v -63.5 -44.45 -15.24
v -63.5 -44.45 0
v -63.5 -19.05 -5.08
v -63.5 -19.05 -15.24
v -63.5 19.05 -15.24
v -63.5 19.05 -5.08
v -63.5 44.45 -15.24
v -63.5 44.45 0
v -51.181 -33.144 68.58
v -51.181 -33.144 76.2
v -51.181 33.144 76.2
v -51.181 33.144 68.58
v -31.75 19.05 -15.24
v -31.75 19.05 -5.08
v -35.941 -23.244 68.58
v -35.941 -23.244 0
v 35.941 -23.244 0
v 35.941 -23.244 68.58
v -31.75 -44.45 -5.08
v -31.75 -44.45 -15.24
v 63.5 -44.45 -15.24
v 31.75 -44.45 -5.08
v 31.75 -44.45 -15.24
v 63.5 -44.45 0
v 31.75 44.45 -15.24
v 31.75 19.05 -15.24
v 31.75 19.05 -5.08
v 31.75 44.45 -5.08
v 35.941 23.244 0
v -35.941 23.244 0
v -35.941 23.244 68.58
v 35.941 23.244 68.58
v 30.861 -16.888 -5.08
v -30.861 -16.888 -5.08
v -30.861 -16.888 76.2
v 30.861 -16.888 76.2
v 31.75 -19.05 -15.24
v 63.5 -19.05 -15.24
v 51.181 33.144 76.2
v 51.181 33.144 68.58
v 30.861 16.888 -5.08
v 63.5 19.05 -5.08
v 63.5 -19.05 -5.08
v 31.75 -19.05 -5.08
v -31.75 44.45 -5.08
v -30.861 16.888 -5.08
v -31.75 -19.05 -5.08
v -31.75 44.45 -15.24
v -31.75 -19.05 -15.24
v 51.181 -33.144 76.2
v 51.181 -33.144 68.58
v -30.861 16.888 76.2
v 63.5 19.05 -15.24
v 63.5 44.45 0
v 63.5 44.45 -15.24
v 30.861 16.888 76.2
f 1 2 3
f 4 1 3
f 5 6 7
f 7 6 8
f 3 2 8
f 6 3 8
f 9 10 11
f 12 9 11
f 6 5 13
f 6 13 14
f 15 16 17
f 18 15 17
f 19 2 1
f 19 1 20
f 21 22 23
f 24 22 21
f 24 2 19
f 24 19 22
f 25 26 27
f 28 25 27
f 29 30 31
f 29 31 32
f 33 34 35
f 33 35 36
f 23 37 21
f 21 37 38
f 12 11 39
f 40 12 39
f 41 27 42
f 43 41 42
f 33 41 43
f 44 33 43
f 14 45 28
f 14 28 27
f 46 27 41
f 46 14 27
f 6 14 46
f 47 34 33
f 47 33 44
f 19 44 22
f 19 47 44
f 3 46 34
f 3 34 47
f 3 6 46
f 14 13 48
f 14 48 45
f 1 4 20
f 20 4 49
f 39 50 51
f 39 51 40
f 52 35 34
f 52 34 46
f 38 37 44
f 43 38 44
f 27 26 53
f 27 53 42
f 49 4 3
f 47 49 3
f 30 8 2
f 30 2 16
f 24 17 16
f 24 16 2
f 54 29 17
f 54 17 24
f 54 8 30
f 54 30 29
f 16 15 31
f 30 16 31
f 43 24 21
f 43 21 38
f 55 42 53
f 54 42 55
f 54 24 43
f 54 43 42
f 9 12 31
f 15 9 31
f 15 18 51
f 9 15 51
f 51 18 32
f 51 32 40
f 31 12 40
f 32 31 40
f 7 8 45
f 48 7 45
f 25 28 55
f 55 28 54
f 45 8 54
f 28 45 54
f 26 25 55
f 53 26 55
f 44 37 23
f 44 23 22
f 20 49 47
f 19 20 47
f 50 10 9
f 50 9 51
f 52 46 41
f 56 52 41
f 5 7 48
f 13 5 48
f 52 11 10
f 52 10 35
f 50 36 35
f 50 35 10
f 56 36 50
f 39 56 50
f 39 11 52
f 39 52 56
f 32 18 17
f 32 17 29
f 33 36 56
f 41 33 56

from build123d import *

# Parameters (mm, degrees)
F0_W      = 127
F0_H      = 88.9
F1_DEPTH  = 15.24
F2_W      = 63.5
F2_H      = 10.16
F3_DEPTH  = 88.9
F4_W      = 38.1
F4_H      = 10.16
F5_DEPTH  = 127
F6_W      = 71.8820020556
F6_H      = 46.4872904122
F7_DEPTH  = 76.2
F8_W      = 61.7219954729
F8_H      = 33.7767079473
F9_DEPTH  = 101.6
F10_W     = 102.3619994521
F10_H     = 66.2887096405
F10_W_2   = 71.8820020556
F10_H_2   = 46.4872904122
F11_DEPTH = 7.62


with BuildPart() as f1:
    # F0 (on Top) → F1 (new body)
    with BuildSketch(Plane.XY):
        Rectangle(F0_W, F0_H)
    extrude(amount=-F1_DEPTH)

    # F2 (on face) → F3 (cut)
    with BuildSketch(Plane.XZ.offset(44.45)):
        with Locations((0, -10.16)):
            Rectangle(F2_W, F2_H)
    extrude(amount=-F3_DEPTH, mode=Mode.SUBTRACT)

    # F4 (on face) → F5 (cut)
    with BuildSketch(Plane(origin=(-63.5, 0, 0), x_dir=(0, -1, 0), z_dir=(-1, 0, 0))):
        with Locations((0, -10.16)):
            Rectangle(F4_W, F4_H)
    extrude(amount=-F5_DEPTH, mode=Mode.SUBTRACT)

    # F6 (on face) → F7 (join)
    with BuildSketch(Plane.XY):
        Rectangle(F6_W, F6_H)
    extrude(amount=F7_DEPTH)

    # F8 (on face) → F9 (cut)
    with BuildSketch(Plane.XY.offset(76.2)):
        Rectangle(F8_W, F8_H)
    extrude(amount=-F9_DEPTH, mode=Mode.SUBTRACT)

    # F10 (on face) → F11 (join)
    with BuildSketch(Plane.XY.offset(76.2)):
        Rectangle(F10_W, F10_H)
        Rectangle(F10_W_2, F10_H_2, mode=Mode.SUBTRACT)
    extrude(amount=-F11_DEPTH)


solid = f1.part
